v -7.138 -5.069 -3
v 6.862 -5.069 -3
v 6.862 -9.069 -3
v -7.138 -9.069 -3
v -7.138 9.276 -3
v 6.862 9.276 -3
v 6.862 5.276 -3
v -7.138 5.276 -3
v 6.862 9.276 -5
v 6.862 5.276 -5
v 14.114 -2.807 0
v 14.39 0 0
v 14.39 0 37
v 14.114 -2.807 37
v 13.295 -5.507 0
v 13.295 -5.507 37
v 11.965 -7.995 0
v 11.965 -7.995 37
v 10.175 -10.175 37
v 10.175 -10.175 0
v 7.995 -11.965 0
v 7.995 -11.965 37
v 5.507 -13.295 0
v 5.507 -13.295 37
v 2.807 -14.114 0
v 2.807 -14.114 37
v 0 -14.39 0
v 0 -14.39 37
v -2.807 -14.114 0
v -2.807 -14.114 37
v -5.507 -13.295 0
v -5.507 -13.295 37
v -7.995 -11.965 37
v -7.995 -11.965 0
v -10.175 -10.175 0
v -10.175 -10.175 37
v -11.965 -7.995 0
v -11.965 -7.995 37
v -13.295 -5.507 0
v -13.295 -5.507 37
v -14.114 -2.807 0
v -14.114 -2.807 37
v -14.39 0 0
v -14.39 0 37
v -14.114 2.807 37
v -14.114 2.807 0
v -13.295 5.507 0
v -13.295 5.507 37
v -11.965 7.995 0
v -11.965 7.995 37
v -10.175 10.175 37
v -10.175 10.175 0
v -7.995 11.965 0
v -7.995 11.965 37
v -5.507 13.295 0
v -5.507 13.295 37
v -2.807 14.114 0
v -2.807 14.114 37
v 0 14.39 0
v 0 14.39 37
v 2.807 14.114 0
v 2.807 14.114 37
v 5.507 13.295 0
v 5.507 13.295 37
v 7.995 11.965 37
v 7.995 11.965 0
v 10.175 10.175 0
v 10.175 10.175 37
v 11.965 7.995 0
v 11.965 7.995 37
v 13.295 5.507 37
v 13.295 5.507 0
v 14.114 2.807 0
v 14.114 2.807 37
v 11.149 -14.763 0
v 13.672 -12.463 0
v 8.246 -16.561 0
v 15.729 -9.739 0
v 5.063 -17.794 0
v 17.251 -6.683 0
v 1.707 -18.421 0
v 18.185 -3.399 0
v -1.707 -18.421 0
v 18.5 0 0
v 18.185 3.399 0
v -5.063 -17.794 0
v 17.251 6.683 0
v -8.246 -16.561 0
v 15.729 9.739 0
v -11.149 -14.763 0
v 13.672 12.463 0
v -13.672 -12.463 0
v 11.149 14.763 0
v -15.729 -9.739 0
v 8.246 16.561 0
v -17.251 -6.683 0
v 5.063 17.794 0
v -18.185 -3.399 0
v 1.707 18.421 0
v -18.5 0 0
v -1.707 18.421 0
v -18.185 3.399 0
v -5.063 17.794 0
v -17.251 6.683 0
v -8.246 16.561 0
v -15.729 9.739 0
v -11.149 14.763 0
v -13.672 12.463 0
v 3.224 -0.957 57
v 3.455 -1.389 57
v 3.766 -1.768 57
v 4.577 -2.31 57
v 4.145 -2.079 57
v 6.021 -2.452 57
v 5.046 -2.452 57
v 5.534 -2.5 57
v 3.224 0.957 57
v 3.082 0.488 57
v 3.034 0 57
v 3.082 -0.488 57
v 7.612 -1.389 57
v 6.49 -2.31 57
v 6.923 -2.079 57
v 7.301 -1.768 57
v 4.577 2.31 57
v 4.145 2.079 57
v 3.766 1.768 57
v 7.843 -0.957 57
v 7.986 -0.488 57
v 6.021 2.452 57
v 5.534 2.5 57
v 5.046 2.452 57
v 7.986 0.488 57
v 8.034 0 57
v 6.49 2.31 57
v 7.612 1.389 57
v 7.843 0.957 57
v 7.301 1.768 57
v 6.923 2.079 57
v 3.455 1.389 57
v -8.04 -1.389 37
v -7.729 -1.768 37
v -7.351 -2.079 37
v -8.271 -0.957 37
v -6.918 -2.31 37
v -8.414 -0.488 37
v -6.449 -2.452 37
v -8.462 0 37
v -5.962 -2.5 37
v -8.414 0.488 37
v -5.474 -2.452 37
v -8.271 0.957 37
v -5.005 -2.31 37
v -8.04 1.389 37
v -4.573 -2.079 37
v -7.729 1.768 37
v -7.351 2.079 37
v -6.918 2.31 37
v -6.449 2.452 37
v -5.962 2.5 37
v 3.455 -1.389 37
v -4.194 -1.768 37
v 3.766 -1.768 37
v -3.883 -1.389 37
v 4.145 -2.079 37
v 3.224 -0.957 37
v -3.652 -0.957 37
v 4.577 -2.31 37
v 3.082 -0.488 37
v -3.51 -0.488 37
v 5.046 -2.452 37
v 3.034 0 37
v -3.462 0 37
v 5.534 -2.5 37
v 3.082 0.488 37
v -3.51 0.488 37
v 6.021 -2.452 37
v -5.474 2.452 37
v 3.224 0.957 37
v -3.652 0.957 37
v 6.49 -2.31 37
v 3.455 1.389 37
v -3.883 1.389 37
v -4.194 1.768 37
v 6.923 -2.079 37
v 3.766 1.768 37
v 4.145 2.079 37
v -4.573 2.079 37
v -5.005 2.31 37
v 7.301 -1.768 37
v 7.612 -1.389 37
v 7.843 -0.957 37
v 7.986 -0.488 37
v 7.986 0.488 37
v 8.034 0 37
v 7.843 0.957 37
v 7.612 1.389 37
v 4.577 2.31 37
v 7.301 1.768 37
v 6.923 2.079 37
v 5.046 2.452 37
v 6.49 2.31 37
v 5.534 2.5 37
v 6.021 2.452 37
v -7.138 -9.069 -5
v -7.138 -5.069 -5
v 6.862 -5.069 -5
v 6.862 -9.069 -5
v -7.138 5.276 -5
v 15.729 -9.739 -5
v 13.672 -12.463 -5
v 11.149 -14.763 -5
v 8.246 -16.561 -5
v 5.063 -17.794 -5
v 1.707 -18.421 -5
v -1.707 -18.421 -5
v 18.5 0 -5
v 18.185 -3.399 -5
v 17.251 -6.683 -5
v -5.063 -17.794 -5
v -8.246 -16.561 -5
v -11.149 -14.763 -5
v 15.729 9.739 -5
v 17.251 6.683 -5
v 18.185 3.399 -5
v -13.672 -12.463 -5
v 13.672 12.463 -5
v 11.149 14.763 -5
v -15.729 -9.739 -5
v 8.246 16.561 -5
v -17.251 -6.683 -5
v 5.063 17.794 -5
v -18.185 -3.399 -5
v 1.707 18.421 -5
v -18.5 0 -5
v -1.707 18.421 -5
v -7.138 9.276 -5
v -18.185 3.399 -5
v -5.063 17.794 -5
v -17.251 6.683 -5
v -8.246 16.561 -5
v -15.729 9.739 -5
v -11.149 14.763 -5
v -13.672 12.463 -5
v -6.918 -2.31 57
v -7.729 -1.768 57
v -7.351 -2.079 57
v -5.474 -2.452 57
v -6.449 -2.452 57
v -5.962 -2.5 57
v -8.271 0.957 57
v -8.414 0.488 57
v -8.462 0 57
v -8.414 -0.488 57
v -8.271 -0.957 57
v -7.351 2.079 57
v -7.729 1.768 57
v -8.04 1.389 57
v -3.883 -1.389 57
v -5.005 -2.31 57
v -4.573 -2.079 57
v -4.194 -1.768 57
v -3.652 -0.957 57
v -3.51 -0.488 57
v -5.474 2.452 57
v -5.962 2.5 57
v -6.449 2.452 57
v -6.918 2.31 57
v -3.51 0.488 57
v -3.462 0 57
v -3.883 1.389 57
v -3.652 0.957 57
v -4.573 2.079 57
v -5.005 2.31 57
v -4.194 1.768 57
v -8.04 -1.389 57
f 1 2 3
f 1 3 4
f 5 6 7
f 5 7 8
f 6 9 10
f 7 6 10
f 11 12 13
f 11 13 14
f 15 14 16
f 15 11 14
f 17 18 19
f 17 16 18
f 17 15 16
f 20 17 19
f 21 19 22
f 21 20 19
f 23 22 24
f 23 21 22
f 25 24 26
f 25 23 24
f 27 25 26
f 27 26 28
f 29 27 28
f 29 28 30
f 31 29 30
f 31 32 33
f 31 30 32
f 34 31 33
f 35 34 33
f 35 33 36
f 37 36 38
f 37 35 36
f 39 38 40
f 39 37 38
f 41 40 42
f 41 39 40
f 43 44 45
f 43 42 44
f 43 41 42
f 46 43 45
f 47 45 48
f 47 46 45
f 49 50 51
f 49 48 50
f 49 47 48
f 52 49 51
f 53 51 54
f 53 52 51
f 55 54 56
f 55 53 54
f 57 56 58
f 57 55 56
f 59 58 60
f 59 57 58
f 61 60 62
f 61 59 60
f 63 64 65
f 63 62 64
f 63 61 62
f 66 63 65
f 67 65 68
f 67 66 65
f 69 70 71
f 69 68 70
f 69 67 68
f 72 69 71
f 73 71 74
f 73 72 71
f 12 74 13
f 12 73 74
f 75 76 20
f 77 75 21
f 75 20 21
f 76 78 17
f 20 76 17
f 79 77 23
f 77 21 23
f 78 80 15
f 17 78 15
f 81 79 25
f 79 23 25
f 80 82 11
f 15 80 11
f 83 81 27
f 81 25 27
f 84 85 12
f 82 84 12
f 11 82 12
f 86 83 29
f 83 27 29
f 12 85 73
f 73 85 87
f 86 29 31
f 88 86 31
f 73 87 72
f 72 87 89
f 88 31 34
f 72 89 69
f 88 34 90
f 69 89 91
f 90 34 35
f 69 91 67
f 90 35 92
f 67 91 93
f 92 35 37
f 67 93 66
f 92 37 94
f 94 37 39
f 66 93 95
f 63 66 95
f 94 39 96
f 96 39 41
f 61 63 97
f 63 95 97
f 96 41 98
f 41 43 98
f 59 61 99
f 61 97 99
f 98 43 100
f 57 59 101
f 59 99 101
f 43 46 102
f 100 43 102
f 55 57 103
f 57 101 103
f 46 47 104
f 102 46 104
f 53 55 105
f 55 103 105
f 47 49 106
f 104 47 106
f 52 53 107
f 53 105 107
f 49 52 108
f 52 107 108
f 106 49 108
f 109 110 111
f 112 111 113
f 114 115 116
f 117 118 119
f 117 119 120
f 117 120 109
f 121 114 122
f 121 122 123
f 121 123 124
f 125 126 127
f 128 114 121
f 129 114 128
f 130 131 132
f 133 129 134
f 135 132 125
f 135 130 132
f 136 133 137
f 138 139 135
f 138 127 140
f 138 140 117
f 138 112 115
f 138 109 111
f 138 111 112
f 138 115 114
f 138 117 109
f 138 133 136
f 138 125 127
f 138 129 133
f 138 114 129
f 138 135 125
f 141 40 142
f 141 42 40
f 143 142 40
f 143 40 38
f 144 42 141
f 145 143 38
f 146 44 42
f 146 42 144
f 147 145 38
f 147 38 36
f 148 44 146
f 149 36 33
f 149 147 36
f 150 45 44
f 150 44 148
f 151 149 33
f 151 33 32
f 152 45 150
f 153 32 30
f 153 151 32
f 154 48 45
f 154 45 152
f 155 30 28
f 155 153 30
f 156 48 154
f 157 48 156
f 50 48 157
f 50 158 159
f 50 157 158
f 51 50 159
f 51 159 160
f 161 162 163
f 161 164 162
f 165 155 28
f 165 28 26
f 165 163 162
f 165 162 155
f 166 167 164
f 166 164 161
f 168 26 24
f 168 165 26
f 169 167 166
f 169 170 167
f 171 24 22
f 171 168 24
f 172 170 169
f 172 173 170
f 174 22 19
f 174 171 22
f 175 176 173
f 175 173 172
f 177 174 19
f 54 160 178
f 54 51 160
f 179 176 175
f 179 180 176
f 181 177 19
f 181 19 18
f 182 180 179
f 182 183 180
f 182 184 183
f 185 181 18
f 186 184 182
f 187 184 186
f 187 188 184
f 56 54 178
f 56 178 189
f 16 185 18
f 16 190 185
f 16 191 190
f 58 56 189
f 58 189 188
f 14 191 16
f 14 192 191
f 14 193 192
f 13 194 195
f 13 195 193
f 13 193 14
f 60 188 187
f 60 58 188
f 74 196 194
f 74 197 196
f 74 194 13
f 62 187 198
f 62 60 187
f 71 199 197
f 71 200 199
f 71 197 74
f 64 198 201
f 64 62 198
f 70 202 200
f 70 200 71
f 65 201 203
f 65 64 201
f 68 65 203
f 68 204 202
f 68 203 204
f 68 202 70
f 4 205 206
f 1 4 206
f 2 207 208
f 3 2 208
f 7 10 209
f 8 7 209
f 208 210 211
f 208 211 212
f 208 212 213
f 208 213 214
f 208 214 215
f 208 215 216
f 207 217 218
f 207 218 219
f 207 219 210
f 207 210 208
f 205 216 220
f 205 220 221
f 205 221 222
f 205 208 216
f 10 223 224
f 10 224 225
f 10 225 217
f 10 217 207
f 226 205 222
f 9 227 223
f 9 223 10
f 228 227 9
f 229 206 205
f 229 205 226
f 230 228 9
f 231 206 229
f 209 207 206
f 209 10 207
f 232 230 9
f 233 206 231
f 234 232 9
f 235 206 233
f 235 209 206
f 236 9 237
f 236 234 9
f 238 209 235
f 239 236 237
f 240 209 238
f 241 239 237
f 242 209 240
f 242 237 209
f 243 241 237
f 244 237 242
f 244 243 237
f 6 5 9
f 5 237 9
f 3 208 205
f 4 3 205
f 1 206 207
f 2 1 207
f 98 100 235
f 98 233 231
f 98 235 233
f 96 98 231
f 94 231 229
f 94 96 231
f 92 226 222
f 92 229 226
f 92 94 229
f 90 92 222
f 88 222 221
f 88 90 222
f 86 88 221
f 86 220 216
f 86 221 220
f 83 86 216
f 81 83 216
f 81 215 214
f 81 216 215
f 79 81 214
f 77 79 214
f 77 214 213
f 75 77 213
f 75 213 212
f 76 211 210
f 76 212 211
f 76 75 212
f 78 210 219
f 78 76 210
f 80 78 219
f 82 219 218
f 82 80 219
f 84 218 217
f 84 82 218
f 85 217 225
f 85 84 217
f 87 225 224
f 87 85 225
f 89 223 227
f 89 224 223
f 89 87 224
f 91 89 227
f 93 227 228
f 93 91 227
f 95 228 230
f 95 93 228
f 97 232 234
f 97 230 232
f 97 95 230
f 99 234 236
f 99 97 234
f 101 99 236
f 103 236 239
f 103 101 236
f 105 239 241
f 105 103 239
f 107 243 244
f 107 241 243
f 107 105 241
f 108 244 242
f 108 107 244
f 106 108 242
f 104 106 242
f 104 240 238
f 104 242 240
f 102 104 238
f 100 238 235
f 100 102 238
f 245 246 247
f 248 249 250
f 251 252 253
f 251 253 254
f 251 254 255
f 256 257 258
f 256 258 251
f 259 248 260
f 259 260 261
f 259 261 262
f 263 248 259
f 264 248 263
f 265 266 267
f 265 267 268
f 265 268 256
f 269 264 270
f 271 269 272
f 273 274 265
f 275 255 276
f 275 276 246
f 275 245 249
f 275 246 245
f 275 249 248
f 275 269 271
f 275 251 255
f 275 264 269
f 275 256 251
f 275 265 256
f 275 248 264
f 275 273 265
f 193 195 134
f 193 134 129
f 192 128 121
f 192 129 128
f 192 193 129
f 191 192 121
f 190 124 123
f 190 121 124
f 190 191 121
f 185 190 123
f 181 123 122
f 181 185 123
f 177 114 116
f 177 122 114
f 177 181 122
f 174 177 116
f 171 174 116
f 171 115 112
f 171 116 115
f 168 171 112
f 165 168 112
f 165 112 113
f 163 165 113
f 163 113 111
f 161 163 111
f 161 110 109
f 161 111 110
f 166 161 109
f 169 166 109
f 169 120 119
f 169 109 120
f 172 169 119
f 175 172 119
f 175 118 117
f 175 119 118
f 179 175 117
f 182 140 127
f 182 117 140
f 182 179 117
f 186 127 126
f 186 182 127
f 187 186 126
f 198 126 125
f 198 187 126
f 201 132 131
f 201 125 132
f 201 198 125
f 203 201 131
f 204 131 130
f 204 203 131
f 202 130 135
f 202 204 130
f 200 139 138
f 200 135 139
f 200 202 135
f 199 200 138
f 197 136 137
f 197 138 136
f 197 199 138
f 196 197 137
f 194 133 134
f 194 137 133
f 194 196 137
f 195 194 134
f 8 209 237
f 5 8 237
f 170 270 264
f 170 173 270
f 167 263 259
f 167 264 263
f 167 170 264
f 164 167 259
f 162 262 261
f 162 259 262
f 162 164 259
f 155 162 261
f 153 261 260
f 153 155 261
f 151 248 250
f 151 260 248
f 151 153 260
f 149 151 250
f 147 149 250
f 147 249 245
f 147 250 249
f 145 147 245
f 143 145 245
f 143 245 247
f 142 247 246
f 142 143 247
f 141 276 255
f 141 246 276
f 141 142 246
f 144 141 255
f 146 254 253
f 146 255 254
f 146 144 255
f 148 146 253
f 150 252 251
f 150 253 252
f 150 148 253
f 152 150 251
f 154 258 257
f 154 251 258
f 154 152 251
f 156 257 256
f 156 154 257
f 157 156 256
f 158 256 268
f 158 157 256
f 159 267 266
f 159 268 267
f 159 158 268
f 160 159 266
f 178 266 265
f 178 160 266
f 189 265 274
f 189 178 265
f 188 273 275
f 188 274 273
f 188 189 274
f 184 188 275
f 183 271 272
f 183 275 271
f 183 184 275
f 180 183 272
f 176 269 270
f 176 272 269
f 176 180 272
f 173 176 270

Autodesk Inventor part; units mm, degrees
ref_plane "YZ Plane" through (0, 0, 0) normal (1, 0, 0) x (0, 1, 0)
ref_plane "XZ Plane" through (0, 0, 0) normal (0, 1, 0) x (-1, 0, 0)
ref_plane "XY Plane" through (0, 0, 0) normal (0, 0, 1) x (1, 0, 0)
sketch "Sketch1" plane through (0, 0, 0) normal (0, 0, 1) x (1, 0, 0)
  circle A0 centre (0, 0) radius 14.39
  dimension "d0" = 28.78
extrude "Extrusion1" add sketch "Sketch1" along normal blind 37
sketch "Sketch2" plane through (0, 0, 37) normal (0, 0, 1) x (1, 0, 0)
  circle A0 centre (-5.9617, 0) radius 2.5
  circle A1 centre (5.5337, 0) radius 2.5
  point P0 (0, 0)
  dimension "d3" = 5
  dimension "d4" = 5
extrude "Extrusion2" add sketch "Sketch2" along normal blind 20
sketch "Sketch3" plane through (0, 0, 0) normal (0, 0, -1) x (-1, 0, 0)
  circle A0 centre (0, 0) radius 18.5
  dimension "d7" = 37
extrude "Extrusion3" add sketch "Sketch3" along normal blind 5
sketch "Sketch4" plane through (0, 0, -5) normal (0, 0, -1) x (-1, 0, 0)
  line L0 (-6.8621, 5.2759) -> (7.1379, 5.2759)
  line L1 (7.1379, 5.2759) -> (7.1379, 9.2759)
  line L2 (7.1379, 9.2759) -> (-6.8621, 9.2759)
  line L3 (-6.8621, 9.2759) -> (-6.8621, 5.2759)
  line L4 (-6.8621, 5.2759) -> (7.1379, 9.2759) construction
  line L5 (7.1379, 5.2759) -> (-6.8621, 9.2759) construction
  line L6 (-6.8621, -9.069) -> (7.1379, -9.069)
  line L7 (7.1379, -9.069) -> (7.1379, -5.069)
  line L8 (7.1379, -5.069) -> (-6.8621, -5.069)
  line L9 (-6.8621, -5.069) -> (-6.8621, -9.069)
  line L10 (-6.8621, -9.069) -> (7.1379, -5.069) construction
  line L11 (7.1379, -9.069) -> (-6.8621, -5.069) construction
  point P0 (0, 0)
  point P1 (0.1379, 7.2759)
  point P2 (0.1379, -7.069)
  dimension "d10" = 4
  dimension "d11" = 14
  dimension "d12" = 14
  dimension "d13" = 4
extrude "Extrusion4" cut sketch "Sketch4" against normal blind 2
thread "Thread1" size "M30x3.5" class "6g" standard "ANSI Metric M Profile" full length
equation "\"d12\" = d11"
equation "\"d13\" = d10"
properties part number "USB plug"
